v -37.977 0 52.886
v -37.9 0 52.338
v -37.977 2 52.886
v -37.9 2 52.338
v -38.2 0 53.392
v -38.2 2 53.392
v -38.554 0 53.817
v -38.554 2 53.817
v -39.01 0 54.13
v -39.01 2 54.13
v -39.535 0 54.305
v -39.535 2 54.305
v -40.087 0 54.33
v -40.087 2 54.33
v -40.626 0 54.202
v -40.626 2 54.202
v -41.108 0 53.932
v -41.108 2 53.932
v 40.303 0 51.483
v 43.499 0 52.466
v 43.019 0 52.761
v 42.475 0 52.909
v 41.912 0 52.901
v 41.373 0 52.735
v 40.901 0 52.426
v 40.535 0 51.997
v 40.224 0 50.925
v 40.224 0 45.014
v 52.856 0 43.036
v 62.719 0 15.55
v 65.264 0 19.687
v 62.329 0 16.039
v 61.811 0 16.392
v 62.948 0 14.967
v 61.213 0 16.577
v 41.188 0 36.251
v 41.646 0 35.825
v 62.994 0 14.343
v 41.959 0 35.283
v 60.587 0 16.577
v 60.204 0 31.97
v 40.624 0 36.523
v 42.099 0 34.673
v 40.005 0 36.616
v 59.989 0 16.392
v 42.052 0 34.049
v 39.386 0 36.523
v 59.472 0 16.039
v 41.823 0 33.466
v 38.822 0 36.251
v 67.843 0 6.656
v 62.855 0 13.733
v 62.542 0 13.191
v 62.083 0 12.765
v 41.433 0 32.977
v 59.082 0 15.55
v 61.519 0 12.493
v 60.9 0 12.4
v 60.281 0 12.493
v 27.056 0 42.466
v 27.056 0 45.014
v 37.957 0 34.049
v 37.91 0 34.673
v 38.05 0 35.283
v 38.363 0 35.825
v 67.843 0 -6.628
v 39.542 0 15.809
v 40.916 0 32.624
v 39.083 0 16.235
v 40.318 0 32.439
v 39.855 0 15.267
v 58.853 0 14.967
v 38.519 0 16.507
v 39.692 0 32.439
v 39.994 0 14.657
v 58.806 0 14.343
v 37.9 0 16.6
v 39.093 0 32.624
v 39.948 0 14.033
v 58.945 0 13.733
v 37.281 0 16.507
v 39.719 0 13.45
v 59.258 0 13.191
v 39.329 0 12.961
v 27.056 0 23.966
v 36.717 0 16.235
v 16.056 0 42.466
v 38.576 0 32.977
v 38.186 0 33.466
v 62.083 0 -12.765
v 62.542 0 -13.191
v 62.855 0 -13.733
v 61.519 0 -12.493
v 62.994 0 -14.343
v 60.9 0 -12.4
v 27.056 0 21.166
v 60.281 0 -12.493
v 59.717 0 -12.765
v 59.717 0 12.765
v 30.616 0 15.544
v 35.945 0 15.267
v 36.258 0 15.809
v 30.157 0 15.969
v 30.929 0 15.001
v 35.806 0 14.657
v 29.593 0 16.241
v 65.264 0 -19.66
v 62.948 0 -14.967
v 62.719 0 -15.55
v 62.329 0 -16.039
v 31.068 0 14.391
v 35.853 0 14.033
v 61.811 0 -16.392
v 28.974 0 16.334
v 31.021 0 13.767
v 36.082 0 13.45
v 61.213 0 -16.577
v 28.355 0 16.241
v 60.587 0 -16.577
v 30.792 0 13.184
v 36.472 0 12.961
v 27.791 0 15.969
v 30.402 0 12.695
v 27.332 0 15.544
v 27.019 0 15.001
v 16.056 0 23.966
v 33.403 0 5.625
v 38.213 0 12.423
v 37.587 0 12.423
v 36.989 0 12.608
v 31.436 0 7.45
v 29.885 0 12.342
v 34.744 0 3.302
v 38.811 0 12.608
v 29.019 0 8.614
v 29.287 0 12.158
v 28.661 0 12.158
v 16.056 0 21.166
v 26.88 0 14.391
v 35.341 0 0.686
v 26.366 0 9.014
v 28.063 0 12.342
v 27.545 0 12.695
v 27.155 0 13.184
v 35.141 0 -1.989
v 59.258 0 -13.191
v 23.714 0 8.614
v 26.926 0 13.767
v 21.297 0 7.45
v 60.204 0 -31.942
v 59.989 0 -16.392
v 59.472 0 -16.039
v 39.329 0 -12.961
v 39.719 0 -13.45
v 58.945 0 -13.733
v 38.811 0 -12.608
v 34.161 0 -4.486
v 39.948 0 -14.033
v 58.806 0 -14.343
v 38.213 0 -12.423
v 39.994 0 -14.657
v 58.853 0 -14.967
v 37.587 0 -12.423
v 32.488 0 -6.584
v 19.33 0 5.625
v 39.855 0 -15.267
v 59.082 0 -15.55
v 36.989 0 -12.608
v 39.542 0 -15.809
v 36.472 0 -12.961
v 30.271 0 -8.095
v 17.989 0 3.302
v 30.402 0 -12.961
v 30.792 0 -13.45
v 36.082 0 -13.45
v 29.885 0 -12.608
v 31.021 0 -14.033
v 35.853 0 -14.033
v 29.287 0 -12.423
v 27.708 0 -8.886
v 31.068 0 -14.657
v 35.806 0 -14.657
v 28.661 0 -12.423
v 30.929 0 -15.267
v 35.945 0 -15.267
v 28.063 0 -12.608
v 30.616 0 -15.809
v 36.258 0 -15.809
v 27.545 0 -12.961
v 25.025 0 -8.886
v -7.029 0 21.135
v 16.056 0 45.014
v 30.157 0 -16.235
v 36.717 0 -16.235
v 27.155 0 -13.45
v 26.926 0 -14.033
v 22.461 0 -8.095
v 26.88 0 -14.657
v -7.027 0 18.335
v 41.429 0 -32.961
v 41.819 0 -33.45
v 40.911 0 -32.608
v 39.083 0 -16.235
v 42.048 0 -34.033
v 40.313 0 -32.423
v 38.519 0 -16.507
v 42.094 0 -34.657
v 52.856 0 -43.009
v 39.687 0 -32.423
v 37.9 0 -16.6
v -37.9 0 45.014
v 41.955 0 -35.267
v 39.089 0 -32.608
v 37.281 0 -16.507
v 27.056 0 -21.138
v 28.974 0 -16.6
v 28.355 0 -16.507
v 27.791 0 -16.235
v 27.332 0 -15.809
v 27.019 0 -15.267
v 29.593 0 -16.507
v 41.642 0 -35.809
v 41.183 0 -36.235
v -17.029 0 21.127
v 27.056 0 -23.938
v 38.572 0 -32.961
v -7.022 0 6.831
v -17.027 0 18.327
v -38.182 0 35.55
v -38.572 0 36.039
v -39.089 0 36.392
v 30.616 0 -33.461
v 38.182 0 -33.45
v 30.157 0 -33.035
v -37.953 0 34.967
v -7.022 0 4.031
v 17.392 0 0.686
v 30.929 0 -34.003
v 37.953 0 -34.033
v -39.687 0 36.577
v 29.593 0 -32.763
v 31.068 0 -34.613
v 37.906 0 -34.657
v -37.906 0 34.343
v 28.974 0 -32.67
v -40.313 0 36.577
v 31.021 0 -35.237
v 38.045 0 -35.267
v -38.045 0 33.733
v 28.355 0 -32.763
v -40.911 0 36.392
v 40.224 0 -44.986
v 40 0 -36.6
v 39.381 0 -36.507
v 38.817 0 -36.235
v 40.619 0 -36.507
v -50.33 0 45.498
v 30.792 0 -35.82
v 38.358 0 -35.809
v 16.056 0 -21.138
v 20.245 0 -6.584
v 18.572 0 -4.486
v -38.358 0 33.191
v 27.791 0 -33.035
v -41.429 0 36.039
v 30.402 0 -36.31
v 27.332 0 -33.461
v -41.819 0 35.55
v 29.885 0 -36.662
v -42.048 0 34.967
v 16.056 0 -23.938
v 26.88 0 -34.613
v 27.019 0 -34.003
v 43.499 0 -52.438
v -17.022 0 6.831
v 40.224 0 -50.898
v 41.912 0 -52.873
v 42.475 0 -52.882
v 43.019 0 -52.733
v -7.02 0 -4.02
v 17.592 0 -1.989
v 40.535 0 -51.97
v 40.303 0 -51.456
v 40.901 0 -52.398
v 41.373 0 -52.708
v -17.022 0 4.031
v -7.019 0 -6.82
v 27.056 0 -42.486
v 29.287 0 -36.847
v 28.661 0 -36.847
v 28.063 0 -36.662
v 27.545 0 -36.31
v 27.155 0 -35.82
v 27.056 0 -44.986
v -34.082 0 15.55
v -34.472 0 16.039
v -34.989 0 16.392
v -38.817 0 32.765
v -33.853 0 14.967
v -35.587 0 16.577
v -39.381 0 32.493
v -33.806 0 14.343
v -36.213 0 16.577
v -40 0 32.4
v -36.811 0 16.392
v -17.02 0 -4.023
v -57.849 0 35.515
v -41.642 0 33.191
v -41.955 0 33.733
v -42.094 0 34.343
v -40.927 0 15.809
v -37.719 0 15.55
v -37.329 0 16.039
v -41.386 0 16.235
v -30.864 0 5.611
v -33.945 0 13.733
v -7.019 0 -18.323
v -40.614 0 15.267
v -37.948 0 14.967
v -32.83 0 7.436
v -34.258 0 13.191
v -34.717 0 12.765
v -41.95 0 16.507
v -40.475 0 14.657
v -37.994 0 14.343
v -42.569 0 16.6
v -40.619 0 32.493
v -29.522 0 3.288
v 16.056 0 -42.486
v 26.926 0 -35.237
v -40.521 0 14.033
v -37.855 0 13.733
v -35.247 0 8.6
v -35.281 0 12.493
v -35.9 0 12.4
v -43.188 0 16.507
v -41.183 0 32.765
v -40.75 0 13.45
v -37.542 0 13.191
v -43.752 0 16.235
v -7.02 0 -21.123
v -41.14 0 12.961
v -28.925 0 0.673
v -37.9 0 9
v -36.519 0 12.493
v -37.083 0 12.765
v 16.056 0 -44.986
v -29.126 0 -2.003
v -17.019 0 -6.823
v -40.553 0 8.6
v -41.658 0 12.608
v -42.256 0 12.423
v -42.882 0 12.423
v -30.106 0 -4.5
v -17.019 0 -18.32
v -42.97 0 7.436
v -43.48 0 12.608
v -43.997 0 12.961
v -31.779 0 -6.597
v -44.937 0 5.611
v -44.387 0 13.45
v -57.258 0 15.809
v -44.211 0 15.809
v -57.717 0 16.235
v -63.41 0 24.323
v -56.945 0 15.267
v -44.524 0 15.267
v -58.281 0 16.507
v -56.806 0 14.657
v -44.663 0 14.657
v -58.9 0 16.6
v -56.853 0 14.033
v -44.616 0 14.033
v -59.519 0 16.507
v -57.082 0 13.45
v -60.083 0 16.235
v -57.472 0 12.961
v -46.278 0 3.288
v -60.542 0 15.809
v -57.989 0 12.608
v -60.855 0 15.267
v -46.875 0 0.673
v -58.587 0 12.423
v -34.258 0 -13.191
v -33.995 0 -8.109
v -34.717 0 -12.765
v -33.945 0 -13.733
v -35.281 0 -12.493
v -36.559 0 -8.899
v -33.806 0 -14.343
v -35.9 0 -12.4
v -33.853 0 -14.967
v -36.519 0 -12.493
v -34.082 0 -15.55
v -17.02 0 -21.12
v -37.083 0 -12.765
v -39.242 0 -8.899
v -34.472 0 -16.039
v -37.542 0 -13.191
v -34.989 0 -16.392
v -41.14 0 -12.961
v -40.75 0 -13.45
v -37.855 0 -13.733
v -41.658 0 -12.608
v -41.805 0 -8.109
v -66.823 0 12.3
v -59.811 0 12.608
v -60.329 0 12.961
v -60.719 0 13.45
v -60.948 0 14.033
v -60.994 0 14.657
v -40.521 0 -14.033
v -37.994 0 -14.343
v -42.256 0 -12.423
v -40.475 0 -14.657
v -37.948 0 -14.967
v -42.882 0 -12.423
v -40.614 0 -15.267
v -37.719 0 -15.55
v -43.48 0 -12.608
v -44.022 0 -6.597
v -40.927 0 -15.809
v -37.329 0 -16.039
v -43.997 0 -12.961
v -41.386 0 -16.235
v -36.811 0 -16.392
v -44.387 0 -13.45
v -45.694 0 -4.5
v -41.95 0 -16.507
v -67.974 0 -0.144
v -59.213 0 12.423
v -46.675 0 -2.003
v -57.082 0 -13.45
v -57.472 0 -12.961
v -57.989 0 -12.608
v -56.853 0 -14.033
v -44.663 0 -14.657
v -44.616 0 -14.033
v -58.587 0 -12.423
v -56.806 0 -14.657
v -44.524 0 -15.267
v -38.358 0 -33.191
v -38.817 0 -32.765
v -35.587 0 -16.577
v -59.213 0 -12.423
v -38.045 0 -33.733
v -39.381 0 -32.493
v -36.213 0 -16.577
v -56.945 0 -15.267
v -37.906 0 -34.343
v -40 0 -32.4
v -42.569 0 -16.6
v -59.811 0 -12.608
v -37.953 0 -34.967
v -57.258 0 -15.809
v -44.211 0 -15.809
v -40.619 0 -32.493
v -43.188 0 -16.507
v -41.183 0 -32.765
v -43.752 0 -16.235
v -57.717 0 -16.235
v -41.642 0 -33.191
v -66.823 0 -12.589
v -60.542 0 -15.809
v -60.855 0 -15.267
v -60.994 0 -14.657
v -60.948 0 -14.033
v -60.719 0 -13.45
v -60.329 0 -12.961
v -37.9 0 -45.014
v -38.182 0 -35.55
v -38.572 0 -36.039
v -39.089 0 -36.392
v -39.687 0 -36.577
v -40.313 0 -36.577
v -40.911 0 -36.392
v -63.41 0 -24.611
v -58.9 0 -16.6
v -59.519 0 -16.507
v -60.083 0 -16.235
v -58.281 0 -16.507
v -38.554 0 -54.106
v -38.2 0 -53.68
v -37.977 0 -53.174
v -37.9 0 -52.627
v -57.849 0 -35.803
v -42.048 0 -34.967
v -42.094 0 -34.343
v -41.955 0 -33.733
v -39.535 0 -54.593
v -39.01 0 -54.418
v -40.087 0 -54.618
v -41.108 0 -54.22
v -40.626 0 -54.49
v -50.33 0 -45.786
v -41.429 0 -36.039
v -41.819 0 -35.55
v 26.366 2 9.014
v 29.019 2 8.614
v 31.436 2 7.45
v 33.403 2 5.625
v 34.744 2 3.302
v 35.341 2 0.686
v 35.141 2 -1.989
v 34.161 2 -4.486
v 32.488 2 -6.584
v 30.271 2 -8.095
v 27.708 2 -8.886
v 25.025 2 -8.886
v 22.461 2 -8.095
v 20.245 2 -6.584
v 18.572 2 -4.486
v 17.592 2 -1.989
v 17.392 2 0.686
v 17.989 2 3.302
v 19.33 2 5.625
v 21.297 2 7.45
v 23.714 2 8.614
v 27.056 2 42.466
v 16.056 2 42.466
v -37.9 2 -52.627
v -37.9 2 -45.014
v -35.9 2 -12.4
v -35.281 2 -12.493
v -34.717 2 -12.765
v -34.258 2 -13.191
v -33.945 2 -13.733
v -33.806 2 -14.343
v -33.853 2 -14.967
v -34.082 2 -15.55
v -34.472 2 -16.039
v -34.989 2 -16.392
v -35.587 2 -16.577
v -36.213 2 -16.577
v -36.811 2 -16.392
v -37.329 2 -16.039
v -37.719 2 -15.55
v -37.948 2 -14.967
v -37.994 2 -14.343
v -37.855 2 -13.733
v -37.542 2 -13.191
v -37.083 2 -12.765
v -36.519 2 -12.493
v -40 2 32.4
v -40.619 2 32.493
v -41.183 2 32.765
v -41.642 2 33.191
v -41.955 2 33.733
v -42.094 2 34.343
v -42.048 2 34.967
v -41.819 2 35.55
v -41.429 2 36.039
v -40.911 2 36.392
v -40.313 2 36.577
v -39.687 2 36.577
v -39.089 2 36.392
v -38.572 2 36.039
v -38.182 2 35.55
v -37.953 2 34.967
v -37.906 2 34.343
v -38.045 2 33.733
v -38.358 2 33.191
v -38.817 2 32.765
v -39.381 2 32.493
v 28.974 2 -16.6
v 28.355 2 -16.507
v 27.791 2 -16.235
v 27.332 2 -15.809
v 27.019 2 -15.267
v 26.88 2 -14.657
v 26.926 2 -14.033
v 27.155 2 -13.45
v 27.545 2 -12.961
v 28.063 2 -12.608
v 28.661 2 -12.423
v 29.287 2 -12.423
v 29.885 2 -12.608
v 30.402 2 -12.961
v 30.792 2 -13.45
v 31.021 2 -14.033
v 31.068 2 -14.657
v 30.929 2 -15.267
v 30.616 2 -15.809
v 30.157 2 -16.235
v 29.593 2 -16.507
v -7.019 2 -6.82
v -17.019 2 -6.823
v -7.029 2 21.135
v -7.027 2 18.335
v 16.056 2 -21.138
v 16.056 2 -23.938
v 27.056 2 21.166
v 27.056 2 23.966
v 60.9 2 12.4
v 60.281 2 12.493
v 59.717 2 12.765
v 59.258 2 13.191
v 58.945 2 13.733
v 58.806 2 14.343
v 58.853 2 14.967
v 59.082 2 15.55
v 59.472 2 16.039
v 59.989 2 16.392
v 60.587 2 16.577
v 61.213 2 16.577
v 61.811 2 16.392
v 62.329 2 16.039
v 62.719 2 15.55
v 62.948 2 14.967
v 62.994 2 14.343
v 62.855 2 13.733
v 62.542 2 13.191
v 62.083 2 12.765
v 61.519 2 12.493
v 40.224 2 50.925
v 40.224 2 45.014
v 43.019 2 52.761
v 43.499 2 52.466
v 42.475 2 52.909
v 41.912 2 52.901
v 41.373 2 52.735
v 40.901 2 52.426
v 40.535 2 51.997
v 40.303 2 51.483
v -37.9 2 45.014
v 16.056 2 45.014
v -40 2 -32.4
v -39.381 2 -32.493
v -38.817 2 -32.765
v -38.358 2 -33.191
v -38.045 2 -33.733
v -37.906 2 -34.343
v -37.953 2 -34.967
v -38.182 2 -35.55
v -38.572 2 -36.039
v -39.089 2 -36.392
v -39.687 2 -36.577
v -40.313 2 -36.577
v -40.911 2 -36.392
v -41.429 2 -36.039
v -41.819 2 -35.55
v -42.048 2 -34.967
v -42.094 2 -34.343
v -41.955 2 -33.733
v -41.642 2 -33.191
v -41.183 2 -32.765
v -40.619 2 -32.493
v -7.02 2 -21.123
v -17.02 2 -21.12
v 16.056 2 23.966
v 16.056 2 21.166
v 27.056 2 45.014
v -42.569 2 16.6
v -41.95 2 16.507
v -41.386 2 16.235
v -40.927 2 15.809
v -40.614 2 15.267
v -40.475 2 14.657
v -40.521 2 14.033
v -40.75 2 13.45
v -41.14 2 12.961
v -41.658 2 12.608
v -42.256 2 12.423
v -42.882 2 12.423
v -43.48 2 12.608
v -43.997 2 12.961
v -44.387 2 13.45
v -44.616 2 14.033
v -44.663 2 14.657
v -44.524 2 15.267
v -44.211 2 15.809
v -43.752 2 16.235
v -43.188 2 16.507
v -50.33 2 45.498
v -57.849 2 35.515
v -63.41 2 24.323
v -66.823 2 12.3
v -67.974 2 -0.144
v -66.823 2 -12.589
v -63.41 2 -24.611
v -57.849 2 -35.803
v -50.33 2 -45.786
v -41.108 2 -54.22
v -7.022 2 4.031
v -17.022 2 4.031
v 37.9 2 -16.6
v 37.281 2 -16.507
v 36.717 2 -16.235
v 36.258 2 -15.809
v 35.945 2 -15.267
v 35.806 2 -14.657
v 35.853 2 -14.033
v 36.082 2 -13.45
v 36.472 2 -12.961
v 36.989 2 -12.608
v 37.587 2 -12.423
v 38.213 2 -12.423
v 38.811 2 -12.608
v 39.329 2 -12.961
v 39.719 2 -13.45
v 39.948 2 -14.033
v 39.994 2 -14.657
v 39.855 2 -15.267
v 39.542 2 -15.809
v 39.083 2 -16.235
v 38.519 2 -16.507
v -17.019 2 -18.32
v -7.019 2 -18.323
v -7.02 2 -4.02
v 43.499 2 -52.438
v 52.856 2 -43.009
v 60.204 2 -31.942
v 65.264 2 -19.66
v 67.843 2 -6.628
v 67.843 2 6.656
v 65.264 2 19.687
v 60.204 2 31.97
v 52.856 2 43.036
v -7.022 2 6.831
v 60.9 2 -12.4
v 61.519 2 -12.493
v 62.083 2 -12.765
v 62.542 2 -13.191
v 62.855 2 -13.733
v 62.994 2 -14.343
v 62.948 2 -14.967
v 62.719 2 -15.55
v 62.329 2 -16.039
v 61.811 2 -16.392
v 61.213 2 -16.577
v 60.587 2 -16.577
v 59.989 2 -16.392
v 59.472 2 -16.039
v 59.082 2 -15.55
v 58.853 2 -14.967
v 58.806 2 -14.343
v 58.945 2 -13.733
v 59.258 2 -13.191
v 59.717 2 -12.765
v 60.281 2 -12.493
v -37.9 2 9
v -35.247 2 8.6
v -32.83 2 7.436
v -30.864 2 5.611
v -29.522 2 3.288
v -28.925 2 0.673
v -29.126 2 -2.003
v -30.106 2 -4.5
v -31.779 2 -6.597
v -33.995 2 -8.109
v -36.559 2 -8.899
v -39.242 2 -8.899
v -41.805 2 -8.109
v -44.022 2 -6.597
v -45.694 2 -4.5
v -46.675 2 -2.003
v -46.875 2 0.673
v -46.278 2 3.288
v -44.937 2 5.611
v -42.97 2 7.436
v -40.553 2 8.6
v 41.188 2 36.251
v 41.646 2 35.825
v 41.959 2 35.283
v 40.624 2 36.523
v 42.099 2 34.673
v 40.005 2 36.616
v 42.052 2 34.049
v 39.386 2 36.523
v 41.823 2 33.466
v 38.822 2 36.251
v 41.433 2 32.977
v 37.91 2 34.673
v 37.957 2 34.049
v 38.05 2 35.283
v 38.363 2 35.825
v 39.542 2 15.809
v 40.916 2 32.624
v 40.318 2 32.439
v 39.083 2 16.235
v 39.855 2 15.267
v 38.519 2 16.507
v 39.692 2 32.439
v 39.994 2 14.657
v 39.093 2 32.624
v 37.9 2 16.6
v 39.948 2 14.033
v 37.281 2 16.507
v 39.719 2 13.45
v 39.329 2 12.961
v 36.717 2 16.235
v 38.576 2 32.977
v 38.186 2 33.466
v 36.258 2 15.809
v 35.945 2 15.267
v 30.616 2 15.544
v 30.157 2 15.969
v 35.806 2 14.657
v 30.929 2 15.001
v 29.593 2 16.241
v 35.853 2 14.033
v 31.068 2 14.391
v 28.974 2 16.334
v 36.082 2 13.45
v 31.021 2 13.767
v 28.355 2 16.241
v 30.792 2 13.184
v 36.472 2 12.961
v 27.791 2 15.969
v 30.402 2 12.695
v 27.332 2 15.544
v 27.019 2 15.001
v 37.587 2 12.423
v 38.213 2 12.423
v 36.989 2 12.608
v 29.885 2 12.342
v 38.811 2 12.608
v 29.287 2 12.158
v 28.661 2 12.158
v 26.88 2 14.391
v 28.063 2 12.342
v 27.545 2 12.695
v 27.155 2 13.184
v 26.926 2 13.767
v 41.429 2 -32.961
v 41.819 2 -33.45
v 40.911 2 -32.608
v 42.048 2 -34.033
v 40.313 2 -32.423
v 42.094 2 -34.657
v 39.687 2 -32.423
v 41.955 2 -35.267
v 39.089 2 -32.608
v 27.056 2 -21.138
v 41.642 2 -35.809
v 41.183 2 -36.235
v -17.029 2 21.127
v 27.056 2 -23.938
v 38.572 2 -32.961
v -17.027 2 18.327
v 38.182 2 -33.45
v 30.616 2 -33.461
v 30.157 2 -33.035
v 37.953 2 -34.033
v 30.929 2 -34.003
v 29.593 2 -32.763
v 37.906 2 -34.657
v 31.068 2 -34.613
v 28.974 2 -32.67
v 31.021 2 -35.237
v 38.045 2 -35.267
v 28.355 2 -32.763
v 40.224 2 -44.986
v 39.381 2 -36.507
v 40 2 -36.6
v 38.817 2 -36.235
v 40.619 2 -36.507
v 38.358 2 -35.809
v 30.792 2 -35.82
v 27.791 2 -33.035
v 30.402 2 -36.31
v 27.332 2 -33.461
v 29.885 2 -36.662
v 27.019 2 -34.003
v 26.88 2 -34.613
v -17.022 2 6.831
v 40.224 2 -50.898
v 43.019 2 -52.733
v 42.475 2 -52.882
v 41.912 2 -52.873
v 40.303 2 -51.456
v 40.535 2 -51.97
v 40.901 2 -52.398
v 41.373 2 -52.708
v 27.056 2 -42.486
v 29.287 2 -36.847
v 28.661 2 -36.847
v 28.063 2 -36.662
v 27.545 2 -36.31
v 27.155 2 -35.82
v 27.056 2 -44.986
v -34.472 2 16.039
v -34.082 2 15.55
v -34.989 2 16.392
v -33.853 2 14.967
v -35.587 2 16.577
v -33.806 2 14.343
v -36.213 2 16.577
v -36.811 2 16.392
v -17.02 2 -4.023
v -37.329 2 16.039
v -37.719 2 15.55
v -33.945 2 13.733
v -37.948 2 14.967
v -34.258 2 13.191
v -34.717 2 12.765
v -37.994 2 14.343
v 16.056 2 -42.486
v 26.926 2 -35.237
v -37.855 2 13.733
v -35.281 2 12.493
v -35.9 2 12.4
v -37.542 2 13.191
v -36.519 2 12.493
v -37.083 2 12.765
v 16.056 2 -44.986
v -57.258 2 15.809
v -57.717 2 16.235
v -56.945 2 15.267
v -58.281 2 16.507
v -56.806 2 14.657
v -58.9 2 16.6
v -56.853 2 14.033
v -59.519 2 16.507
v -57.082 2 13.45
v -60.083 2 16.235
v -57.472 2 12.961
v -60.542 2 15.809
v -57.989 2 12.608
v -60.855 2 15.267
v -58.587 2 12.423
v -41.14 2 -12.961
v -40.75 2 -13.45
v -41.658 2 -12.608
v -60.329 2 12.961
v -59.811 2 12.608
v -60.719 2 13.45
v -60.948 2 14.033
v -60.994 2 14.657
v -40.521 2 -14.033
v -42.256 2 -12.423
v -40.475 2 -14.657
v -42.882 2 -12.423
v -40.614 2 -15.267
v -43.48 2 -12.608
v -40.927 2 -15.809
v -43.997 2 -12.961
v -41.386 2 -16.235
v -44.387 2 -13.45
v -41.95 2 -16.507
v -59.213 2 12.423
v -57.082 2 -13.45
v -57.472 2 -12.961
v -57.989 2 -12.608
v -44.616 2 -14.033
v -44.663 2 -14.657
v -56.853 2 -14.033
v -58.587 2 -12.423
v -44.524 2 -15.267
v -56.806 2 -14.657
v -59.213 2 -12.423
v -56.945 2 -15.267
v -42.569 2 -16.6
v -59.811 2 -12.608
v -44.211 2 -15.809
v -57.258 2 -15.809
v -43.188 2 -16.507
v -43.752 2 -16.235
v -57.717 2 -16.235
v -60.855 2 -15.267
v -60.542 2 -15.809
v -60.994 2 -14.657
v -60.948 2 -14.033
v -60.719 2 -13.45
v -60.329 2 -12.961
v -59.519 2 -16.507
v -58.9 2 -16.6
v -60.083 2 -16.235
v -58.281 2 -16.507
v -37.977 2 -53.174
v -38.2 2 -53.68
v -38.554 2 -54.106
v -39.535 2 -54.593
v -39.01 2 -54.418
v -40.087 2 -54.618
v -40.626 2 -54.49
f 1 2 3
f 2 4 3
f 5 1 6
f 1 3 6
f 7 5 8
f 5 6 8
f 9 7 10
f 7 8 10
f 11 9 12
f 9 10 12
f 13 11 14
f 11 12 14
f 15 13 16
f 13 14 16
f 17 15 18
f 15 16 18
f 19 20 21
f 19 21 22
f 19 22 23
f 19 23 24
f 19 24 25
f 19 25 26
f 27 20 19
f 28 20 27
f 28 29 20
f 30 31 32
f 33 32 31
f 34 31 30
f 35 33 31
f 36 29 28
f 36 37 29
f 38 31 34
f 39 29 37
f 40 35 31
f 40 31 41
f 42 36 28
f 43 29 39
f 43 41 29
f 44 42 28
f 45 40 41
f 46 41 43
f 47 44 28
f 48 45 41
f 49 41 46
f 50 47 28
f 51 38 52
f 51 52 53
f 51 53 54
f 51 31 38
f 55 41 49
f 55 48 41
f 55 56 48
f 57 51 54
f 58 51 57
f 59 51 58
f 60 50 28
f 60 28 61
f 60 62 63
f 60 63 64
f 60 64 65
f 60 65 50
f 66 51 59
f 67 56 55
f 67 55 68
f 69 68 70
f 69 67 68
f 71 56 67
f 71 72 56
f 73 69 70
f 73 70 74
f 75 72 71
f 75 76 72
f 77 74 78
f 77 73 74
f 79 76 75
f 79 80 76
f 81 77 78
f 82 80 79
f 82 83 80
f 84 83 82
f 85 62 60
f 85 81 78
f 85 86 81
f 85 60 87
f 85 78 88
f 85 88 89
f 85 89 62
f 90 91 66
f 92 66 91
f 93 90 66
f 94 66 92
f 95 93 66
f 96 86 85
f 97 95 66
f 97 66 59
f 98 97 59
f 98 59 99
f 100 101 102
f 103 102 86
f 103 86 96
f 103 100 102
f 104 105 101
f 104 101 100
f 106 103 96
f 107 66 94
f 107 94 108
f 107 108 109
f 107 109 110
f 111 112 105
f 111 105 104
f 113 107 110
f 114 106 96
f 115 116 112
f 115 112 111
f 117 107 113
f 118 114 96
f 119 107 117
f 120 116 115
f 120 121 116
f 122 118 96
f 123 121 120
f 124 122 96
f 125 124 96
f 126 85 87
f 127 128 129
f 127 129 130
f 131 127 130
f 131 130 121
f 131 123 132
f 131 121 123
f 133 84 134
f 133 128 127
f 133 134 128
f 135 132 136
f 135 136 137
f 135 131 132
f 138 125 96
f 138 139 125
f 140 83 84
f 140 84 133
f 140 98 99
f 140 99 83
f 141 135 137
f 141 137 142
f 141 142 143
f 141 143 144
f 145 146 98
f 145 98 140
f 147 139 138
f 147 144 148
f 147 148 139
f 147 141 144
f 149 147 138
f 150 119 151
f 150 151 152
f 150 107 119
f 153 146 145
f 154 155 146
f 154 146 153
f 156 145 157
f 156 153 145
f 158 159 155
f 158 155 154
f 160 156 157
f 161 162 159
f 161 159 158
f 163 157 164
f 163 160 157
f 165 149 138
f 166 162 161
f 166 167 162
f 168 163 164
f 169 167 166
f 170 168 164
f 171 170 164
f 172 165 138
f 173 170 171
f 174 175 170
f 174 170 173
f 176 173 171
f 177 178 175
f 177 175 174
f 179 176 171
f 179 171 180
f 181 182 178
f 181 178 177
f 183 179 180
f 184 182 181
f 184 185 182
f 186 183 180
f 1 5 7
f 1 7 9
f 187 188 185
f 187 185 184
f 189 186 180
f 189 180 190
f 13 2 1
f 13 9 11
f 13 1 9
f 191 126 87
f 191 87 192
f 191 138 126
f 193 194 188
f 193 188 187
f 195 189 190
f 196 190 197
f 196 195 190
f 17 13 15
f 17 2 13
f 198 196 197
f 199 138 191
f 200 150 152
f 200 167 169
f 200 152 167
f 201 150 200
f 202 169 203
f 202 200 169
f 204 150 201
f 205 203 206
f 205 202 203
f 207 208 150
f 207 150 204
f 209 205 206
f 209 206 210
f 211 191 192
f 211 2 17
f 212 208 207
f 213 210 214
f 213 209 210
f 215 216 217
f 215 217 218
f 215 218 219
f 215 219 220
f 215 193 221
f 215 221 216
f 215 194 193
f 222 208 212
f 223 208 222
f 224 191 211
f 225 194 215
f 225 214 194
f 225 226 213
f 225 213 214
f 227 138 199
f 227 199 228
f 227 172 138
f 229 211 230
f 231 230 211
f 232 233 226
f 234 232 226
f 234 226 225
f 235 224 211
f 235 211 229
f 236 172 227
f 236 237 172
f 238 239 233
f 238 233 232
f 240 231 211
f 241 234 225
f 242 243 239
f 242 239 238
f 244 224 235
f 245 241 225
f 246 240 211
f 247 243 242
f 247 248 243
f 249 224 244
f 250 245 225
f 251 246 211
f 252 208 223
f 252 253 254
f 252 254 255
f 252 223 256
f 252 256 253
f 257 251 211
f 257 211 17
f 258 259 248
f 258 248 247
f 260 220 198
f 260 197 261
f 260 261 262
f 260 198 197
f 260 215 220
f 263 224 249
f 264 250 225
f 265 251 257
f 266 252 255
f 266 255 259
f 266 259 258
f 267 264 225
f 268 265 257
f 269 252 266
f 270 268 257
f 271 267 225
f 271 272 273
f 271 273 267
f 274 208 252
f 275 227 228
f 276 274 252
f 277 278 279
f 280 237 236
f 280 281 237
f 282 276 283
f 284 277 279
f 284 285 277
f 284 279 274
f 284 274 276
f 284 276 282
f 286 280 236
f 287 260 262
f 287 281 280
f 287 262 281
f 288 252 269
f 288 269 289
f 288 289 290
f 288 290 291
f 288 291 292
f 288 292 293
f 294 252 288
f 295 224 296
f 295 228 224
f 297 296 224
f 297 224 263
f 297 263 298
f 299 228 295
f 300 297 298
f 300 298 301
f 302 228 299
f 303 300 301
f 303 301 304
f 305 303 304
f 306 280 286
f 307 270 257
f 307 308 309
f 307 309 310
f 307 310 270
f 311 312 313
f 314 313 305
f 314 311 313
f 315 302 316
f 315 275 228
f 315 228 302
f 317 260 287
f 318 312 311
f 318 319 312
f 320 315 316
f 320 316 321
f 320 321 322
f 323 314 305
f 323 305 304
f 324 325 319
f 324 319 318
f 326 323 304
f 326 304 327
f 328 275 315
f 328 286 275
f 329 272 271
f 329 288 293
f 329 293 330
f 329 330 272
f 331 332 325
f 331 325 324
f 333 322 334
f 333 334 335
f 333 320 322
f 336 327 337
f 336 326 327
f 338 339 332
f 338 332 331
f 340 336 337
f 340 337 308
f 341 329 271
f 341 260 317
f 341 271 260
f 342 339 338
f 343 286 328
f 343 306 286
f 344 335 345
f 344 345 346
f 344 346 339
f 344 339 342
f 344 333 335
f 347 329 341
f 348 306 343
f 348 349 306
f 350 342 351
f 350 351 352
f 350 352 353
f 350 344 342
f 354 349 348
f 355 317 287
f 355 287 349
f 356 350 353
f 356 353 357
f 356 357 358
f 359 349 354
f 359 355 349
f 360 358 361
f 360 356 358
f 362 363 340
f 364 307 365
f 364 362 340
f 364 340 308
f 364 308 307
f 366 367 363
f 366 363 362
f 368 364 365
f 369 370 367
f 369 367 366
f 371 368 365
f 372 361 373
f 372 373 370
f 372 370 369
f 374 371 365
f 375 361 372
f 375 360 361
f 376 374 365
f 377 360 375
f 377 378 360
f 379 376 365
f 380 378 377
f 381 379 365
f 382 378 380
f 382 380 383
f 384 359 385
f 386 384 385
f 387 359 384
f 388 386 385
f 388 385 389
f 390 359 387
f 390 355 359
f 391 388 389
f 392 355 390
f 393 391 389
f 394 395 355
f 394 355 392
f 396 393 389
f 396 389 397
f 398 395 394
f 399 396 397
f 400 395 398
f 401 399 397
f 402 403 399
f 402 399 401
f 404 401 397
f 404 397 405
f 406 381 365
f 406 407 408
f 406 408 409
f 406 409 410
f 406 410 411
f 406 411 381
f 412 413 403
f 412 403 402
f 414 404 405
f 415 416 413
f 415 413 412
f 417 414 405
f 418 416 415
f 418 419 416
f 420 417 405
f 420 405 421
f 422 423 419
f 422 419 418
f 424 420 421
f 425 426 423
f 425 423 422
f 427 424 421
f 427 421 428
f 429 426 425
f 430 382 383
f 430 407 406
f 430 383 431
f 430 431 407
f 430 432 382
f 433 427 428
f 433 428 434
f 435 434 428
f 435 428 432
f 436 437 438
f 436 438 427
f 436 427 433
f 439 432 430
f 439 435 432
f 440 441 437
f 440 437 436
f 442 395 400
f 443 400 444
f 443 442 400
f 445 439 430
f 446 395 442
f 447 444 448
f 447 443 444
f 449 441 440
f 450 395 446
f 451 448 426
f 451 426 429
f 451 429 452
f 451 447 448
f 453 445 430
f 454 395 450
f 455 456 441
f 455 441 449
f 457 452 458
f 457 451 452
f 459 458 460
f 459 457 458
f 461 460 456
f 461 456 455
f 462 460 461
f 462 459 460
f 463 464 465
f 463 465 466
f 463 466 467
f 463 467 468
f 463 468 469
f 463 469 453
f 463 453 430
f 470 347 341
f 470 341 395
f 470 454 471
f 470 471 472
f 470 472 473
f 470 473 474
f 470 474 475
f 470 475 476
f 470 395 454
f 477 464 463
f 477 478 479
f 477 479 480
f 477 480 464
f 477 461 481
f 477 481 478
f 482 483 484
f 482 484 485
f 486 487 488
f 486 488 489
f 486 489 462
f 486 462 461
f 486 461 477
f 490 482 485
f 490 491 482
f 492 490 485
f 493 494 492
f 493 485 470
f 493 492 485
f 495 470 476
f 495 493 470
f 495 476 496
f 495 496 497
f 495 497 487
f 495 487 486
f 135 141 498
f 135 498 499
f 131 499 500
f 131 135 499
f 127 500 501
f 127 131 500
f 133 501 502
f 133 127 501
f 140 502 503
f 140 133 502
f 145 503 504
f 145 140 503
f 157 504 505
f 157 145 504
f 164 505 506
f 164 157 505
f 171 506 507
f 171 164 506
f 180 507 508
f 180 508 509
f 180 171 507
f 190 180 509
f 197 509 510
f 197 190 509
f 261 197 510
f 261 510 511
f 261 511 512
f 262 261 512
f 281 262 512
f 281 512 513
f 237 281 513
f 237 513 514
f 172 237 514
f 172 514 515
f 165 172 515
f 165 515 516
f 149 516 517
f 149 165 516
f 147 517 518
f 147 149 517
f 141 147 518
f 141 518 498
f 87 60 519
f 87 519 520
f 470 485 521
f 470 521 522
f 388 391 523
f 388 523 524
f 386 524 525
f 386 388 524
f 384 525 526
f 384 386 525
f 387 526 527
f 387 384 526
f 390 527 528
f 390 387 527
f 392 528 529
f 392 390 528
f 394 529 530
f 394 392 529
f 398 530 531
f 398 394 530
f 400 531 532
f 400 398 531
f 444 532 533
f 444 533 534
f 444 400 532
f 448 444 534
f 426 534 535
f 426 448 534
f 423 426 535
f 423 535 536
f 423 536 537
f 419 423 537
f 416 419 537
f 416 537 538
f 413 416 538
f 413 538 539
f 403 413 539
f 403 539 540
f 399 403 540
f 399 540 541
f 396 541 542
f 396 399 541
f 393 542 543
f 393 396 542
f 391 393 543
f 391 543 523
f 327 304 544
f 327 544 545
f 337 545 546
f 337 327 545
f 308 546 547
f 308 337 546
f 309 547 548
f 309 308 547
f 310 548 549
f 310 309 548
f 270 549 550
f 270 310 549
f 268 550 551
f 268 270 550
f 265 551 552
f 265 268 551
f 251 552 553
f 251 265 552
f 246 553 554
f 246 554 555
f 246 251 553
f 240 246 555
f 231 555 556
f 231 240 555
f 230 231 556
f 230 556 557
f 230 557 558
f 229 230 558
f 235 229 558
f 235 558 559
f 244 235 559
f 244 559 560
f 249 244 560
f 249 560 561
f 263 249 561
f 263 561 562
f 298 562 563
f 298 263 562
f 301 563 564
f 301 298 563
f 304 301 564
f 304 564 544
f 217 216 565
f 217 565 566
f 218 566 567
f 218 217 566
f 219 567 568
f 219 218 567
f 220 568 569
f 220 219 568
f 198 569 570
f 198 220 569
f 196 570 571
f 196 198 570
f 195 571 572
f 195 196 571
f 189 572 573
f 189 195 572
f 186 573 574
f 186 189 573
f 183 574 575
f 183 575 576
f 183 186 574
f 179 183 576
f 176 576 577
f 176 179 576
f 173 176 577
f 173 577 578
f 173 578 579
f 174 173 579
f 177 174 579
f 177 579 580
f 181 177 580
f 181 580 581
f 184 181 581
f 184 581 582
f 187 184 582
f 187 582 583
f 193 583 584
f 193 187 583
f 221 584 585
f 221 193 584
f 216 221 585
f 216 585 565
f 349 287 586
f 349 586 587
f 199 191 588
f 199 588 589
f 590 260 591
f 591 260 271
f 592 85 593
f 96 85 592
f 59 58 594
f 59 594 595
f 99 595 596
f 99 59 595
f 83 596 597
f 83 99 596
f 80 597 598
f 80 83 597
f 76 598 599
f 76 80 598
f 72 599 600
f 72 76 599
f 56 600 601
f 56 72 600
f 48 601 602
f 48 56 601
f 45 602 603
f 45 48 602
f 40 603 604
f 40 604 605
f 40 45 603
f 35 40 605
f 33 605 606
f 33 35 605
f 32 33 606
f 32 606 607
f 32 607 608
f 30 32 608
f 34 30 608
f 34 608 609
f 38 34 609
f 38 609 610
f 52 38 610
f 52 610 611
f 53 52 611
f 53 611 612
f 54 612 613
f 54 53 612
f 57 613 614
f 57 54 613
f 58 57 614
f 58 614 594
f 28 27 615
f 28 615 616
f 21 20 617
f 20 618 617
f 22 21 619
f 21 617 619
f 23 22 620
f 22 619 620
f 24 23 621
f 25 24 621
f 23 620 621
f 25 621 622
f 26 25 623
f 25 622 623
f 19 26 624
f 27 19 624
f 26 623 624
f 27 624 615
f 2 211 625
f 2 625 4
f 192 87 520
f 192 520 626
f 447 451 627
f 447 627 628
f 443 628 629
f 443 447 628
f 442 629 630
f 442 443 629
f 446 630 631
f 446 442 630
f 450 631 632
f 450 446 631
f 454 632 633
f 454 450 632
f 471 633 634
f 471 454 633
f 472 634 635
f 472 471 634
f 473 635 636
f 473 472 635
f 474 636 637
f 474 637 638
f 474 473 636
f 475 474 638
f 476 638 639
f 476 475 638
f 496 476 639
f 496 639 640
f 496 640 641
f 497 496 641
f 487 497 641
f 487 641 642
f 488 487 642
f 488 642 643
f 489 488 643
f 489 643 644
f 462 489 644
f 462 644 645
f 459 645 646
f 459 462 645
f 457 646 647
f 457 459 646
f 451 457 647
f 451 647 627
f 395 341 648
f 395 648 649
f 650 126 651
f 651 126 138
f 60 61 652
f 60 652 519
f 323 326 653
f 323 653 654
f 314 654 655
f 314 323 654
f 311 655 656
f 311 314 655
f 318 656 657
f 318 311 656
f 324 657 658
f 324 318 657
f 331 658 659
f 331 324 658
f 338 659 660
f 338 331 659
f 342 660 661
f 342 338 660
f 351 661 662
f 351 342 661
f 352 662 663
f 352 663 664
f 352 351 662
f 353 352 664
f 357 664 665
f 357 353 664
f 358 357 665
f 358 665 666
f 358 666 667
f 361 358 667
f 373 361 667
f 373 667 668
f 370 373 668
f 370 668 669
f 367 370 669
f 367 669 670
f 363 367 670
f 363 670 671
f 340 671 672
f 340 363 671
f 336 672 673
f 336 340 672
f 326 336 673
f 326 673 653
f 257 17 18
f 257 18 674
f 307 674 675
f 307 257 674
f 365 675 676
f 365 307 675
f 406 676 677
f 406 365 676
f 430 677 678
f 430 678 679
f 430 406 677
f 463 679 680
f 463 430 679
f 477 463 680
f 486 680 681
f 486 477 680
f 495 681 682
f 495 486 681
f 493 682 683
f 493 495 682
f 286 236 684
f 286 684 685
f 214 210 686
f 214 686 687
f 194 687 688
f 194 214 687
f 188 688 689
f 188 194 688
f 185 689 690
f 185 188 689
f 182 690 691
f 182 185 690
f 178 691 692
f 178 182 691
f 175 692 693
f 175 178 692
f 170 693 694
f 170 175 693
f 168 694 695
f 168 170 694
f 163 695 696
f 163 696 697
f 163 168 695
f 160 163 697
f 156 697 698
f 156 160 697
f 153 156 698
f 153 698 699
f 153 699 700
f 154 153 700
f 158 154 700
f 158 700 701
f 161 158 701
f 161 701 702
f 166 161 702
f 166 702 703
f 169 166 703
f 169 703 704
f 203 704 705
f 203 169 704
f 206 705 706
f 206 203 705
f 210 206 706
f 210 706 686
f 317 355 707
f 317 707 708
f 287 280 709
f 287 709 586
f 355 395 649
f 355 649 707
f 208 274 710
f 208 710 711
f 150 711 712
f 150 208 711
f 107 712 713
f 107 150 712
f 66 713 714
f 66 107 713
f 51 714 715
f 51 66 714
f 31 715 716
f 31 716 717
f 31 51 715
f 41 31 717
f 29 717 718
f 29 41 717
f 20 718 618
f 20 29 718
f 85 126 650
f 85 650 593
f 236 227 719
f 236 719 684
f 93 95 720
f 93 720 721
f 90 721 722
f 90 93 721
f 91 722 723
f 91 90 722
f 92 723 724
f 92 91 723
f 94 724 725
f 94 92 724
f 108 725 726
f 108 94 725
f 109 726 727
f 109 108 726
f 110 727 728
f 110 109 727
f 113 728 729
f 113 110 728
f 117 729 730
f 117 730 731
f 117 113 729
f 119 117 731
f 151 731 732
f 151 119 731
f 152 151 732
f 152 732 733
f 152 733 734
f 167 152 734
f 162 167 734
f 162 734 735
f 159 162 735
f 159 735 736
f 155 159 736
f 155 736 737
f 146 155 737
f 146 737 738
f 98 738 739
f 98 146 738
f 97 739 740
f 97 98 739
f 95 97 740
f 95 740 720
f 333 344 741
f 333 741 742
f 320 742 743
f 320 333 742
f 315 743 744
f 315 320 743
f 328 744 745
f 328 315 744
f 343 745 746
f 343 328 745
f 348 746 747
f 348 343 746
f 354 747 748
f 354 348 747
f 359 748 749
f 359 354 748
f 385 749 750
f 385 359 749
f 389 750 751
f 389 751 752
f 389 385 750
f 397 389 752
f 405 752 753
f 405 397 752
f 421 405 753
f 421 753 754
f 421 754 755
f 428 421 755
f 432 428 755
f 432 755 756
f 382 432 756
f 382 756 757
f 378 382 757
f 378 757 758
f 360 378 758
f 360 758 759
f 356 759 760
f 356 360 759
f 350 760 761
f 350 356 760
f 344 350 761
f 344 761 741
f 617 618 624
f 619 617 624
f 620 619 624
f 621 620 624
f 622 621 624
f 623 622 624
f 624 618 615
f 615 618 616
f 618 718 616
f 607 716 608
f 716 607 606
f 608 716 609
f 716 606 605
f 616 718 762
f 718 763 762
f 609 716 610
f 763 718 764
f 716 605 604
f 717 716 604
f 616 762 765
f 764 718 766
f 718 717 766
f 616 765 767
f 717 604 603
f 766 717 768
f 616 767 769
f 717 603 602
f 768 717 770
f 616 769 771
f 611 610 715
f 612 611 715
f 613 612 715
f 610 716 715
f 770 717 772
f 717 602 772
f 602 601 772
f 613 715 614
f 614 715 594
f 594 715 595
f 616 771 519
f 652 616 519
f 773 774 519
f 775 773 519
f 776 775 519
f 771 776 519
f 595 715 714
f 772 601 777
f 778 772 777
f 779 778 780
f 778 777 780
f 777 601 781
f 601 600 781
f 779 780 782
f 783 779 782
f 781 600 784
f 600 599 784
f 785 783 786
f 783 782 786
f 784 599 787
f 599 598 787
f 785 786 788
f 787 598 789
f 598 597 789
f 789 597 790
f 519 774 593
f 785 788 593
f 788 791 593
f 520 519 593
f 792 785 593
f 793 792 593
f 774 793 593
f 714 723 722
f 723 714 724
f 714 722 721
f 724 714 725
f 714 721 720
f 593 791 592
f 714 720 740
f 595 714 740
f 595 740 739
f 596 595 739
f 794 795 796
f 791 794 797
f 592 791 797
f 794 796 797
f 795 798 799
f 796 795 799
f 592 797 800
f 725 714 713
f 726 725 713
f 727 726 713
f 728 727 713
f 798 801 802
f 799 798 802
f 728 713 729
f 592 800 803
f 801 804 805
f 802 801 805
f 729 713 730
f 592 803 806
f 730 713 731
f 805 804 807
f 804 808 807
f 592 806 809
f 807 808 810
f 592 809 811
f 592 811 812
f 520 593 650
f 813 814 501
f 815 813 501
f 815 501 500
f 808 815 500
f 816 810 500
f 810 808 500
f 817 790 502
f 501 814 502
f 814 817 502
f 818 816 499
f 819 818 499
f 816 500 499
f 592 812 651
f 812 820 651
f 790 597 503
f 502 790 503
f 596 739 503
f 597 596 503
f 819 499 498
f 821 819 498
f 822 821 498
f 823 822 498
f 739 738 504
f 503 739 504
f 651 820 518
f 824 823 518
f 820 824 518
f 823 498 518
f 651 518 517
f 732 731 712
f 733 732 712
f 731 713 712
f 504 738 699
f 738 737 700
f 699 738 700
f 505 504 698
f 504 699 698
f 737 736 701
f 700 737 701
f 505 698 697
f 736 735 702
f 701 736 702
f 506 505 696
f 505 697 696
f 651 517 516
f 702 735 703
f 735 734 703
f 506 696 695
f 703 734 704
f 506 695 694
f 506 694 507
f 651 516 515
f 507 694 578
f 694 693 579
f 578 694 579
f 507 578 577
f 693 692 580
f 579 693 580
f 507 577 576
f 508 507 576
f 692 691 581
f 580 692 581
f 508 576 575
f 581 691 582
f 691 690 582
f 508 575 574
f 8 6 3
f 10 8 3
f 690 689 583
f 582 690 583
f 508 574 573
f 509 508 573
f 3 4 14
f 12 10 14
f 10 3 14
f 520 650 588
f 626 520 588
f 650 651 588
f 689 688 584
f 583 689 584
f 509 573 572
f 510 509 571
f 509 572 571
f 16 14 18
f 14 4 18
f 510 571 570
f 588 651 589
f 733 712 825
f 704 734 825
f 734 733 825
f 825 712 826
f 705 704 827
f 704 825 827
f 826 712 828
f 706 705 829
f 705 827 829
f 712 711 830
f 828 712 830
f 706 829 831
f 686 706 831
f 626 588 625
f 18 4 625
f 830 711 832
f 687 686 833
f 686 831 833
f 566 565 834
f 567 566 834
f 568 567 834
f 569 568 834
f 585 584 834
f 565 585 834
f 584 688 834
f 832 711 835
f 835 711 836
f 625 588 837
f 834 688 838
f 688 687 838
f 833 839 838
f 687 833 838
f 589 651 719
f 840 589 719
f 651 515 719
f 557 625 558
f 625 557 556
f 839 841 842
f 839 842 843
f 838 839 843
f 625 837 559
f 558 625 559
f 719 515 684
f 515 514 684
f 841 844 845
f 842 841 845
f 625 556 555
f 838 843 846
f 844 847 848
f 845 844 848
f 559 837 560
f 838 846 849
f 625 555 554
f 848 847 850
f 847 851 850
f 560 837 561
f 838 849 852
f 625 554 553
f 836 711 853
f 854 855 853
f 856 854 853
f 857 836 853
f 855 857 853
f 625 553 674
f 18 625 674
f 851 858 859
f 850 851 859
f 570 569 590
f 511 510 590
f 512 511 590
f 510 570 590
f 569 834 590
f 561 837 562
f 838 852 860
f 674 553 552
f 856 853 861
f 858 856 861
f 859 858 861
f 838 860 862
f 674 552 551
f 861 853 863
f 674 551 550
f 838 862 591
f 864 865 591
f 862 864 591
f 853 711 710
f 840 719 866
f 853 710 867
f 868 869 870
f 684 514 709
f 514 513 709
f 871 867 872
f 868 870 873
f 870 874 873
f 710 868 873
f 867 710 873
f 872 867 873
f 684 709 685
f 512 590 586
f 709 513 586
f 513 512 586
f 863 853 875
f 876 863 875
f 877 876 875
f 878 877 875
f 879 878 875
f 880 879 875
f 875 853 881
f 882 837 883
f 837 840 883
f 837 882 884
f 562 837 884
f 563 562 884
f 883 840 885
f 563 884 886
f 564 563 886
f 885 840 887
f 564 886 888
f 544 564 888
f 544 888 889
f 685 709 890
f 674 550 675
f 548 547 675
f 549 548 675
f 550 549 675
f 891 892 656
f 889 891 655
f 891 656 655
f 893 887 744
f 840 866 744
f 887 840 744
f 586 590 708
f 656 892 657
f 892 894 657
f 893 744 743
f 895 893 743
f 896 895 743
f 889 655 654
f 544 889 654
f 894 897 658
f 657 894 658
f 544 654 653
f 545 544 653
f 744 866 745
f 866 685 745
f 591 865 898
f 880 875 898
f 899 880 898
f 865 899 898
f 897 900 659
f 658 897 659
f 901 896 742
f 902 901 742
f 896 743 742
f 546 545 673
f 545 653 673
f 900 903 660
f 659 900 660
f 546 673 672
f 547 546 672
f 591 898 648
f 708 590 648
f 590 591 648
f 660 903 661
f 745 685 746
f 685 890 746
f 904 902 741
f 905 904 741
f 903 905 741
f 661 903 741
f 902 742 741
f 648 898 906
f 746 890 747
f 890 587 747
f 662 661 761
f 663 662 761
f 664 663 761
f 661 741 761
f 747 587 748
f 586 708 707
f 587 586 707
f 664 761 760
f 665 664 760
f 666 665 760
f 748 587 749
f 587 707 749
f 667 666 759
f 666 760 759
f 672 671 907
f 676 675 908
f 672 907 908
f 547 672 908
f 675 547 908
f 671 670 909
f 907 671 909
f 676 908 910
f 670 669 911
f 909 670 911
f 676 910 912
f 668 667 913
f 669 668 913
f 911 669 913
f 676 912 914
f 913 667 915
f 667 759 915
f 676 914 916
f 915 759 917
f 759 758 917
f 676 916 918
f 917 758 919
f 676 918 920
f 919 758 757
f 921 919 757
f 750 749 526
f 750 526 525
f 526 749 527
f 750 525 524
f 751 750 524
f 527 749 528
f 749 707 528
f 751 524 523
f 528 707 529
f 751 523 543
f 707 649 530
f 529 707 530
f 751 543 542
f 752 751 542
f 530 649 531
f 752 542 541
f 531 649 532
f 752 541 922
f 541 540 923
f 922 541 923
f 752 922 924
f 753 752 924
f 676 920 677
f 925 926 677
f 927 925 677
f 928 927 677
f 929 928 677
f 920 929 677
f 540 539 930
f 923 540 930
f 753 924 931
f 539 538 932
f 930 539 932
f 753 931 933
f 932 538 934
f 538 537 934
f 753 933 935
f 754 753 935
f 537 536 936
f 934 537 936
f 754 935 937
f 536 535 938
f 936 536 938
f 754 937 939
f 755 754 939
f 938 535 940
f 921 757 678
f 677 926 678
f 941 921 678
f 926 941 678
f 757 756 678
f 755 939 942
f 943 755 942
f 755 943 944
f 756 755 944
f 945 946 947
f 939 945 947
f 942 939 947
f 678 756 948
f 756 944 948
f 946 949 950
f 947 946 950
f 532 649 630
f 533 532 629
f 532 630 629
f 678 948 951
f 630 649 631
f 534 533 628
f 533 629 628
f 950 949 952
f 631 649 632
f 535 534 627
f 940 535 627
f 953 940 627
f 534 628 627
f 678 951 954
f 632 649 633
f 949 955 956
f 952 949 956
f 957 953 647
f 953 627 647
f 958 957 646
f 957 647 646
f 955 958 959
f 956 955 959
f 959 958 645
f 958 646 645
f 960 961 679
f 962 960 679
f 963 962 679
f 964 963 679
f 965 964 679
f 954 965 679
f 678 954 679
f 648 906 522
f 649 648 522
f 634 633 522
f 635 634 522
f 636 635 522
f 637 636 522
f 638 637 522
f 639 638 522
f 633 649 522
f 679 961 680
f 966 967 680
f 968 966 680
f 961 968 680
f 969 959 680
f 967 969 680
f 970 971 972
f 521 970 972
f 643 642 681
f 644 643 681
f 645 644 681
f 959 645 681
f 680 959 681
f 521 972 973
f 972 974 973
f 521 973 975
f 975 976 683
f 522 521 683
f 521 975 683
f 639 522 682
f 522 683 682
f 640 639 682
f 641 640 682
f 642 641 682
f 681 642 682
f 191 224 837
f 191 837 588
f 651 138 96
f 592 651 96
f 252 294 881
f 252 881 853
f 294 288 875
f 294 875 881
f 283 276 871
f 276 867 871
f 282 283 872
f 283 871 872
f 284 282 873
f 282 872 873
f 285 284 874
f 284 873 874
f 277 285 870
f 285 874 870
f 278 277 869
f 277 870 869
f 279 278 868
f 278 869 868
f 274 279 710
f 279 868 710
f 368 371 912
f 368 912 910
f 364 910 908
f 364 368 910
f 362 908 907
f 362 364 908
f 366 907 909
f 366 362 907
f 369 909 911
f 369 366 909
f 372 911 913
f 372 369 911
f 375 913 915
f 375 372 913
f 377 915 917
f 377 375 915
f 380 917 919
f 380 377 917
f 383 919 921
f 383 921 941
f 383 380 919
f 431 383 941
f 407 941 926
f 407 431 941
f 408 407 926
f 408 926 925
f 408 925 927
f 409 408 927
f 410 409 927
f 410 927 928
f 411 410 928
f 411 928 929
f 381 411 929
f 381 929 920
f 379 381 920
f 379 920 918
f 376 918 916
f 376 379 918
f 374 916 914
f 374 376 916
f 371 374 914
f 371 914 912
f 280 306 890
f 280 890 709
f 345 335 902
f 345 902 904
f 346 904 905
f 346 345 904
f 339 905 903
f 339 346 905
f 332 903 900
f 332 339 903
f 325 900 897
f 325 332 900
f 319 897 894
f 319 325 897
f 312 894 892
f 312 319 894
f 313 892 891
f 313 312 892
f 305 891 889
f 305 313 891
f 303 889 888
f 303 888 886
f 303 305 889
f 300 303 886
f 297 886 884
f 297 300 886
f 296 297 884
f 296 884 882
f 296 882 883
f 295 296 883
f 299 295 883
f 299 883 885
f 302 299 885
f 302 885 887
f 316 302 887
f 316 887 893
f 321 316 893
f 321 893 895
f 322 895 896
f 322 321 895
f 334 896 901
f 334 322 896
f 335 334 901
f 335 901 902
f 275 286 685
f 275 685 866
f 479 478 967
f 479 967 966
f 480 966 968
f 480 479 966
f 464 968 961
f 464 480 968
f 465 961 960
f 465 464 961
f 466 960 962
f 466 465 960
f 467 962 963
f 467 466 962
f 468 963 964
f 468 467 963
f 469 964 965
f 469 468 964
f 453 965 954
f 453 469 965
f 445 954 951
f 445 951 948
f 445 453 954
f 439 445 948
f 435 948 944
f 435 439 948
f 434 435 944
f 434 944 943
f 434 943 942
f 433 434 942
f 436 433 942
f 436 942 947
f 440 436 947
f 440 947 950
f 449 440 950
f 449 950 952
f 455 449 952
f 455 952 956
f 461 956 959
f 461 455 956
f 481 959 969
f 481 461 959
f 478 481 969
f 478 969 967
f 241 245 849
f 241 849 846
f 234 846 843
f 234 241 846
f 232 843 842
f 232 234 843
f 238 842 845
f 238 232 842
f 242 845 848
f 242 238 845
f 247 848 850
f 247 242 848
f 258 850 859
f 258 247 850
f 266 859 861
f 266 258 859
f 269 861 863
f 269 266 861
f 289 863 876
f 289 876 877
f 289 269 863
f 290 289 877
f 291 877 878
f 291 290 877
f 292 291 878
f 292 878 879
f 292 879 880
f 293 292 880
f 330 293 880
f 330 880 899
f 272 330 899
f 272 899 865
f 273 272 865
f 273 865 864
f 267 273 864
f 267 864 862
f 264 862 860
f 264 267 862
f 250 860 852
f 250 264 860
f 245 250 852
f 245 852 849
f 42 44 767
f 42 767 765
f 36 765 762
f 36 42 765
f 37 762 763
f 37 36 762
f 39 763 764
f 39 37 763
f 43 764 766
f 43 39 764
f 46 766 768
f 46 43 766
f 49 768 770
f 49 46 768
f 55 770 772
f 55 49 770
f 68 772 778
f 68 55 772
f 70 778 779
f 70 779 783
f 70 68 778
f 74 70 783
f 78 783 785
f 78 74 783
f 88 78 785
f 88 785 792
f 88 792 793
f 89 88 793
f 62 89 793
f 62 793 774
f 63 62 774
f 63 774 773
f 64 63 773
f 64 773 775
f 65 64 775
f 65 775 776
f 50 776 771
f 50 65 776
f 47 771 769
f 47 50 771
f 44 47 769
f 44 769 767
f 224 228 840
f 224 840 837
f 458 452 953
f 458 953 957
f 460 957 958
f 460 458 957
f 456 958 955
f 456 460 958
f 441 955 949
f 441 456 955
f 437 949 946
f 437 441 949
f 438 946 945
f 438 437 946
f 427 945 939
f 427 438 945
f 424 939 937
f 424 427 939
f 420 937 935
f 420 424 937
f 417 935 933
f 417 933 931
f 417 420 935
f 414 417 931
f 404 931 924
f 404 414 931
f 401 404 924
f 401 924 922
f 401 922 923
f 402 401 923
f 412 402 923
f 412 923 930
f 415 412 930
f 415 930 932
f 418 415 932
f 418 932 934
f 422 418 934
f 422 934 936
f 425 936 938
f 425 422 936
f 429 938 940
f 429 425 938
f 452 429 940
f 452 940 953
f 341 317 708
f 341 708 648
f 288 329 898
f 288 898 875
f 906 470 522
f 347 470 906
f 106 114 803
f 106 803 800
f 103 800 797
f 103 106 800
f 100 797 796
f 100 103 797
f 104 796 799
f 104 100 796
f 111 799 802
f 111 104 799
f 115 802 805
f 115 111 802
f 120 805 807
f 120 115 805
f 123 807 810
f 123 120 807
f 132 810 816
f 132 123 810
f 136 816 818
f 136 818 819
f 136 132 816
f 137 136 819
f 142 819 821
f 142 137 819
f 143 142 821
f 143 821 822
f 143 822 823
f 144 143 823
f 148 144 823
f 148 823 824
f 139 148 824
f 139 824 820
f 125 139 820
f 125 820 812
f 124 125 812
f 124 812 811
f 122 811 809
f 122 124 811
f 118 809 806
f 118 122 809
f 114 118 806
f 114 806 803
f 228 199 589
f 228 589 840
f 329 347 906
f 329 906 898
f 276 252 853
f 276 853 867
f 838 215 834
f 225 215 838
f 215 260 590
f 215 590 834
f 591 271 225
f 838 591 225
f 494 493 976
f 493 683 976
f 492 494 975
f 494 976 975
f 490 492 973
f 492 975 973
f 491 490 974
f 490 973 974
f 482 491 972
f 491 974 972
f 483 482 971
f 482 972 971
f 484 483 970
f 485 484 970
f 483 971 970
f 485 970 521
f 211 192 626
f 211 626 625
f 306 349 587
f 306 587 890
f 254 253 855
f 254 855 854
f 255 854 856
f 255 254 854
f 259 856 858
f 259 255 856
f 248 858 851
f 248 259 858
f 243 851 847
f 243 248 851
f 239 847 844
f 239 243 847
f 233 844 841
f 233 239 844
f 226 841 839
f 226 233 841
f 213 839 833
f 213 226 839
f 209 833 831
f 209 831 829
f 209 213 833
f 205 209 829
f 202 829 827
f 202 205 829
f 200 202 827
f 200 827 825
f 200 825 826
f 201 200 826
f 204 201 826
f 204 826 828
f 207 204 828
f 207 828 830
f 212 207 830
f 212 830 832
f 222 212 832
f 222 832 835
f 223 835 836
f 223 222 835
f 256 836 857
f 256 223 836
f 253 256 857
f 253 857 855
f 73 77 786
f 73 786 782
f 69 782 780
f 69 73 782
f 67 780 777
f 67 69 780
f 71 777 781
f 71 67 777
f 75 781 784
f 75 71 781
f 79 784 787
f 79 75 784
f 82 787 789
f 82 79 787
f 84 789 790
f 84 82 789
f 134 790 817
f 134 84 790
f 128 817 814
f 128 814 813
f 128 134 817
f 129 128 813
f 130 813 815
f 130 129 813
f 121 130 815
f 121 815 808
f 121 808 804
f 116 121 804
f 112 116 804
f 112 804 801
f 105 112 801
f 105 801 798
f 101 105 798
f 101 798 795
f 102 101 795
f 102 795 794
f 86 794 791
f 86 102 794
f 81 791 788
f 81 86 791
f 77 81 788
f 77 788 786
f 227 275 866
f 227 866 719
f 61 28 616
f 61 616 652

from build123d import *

# Parameters (mm, degrees)
SKETCH1_R           = 2.1
SKETCH1_R_2         = 9
SKETCH1_W           = 11
SKETCH1_H           = 2.8
BOSS_EXTRUDE2_DEPTH = 2
FILLET2_R           = 2
FILLET3_R           = 2
FILLET4_R           = 2
FILLET5_R           = 2


with BuildPart() as part:
    # Sketch1 → Boss-Extrude2 (new body)
    with BuildSketch(Plane(origin=(0, 0, 0), x_dir=(1, 0, 0), z_dir=(0, 1, 0))):
        with BuildLine():
            Line((-37.900233161, -45.013744243), (-37.900233161, -56.220541455))
            ThreePointArc((-37.900233161, -56.220541455), (-67.973978104, 0.144116575), (-37.900233161, 56.508774605))
            Line((-37.900233161, 56.508774605), (-37.900233161, 45.013744243))
            Line((-37.900233161, 45.013744243), (16.055748962, 44.986255757))
            Line((16.055748962, 44.986255757), (16.055748962, 42.486255757))
            Line((16.055748962, 42.486255757), (27.055748962, 42.486255757))
            Line((27.055748962, 42.486255757), (27.055748962, 44.986255757))
            Line((27.055748962, 44.986255757), (40.223874261, 44.986255757))
            Line((40.223874261, 44.986255757), (40.223874261, 54.986255757))
            ThreePointArc((40.223874261, 54.986255757), (68.16767133, -0.013744243), (40.223874261, -55.013744243))
            Line((40.223874261, -55.013744243), (40.223874261, -45.013744243))
            Line((40.223874261, -45.013744243), (27.055748962, -45.013744243))
            Line((27.055748962, -45.013744243), (27.055748962, -42.465581387))
            Line((27.055748962, -42.465581387), (16.055748962, -42.465581387))
            Line((16.055748962, -42.465581387), (16.055748962, -45.013744243))
            Line((16.055748962, -45.013744243), (-37.900233161, -45.013744243))
        make_face()
        with Locations(Location((40.004613264, -34.516033797, 0), (0, 0, 270))):
            Circle(SKETCH1_R, mode=Mode.SUBTRACT)
        with Locations(Location((40.000233161, 34.5, 0), (0, 0, 90))):
            Circle(SKETCH1_R, mode=Mode.SUBTRACT)
        with Locations(Location((37.900233161, -14.5, 0), (0, 0, 270))):
            Circle(SKETCH1_R, mode=Mode.SUBTRACT)
        with Locations(Location((37.900233161, 14.5, 0), (0, 0, 90))):
            Circle(SKETCH1_R, mode=Mode.SUBTRACT)
        with Locations(Location((60.900233161, 14.5, 0), (0, 0, 270))):
            Circle(SKETCH1_R, mode=Mode.SUBTRACT)
        with Locations(Location((60.900233161, -14.5, 0), (0, 0, 90))):
            Circle(SKETCH1_R, mode=Mode.SUBTRACT)
        with Locations(Location((-40.000233161, -34.5, 0), (0, 0, 90))):
            Circle(SKETCH1_R, mode=Mode.SUBTRACT)
        with Locations(Location((-35.900233161, -14.5, 0), (0, 0, 90))):
            Circle(SKETCH1_R, mode=Mode.SUBTRACT)
        with Locations(Location((-58.900233161, -14.5, 0), (0, 0, 270))):
            Circle(SKETCH1_R, mode=Mode.SUBTRACT)
        with Locations(Location((-58.900233161, 14.5, 0), (0, 0, 90))):
            Circle(SKETCH1_R, mode=Mode.SUBTRACT)
        with Locations(Location((-35.900233161, 14.5, 0), (0, 0, 270))):
            Circle(SKETCH1_R, mode=Mode.SUBTRACT)
        with Locations(Location((-40.000233161, 34.5, 0), (0, 0, 270))):
            Circle(SKETCH1_R, mode=Mode.SUBTRACT)
        with Locations(Location((26.366427779, -0.013744243, 0), (0, 0, 270))):
            Circle(SKETCH1_R_2, mode=Mode.SUBTRACT)
        with Locations(Location((-37.900233161, 0, 0), (0, 0, 270))):
            Circle(SKETCH1_R_2, mode=Mode.SUBTRACT)
        with Locations(Location((28.973777757, -14.234221967, 0), (0, 0, 270))):
            Circle(SKETCH1_R, mode=Mode.SUBTRACT)
        with Locations(Location((28.973777757, 14.5, 0), (0, 0, 90))):
            Circle(SKETCH1_R, mode=Mode.SUBTRACT)
        with Locations(Location((28.973777757, 34.770177046, 0), (0, 0, 270))):
            Circle(SKETCH1_R, mode=Mode.SUBTRACT)
        with Locations(Location((-42.568753496, -14.5, 0), (0, 0, 270))):
            Circle(SKETCH1_R, mode=Mode.SUBTRACT)
        with Locations(Location((-42.568753496, 14.5, 0), (0, 0, 90))):
            Circle(SKETCH1_R, mode=Mode.SUBTRACT)
        Polygon((-17.02036954, 21.11975573), (-17.019395908, 18.319755899), (-7.019396513, 18.323233156), (-7.020370144, 21.123232986), align=None, mode=Mode.SUBTRACT)
        with Locations((21.555748962, -22.565581387)):
            Rectangle(SKETCH1_W, SKETCH1_H, mode=Mode.SUBTRACT)
        with Locations((21.555748962, 22.5380929)):
            Rectangle(SKETCH1_W, SKETCH1_H, mode=Mode.SUBTRACT)
        Polygon((-17.022091972, -4.030680267), (-17.022315971, -6.830680258), (-7.022316003, -6.831480257), (-7.022092004, -4.031480266), align=None, mode=Mode.SUBTRACT)
        Polygon((-17.02036954, 4.02323402), (-7.020370144, 4.019756764), (-7.019396513, 6.819756595), (-17.019395908, 6.823233851), align=None, mode=Mode.SUBTRACT)
        Polygon((-17.029404589, -21.127200413), (-7.029407596, -21.134954923), (-7.027236333, -18.334955765), (-17.027233326, -18.327201255), align=None, mode=Mode.SUBTRACT)
    extrude(amount=BOSS_EXTRUDE2_DEPTH)

    # Fillet2
    fillet2_edges = [part.edges().sort_by_distance(p)[0] for p in [
        (-37.900233161, 1, -56.508774605),
    ]]
    fillet(fillet2_edges, radius=FILLET2_R)

    # Fillet3
    fillet3_edges = [part.edges().sort_by_distance(p)[0] for p in [
        (40.223874261, 1, -54.986255757),
    ]]
    fillet(fillet3_edges, radius=FILLET3_R)

    # Fillet4
    fillet4_edges = [part.edges().sort_by_distance(p)[0] for p in [
        (40.223874261, 1, 55.013744243),
    ]]
    fillet(fillet4_edges, radius=FILLET4_R)

    # Fillet5
    fillet5_edges = [part.edges().sort_by_distance(p)[0] for p in [
        (-37.900233161, 1, 56.220541455),
    ]]
    fillet(fillet5_edges, radius=FILLET5_R)


solid = part.part
